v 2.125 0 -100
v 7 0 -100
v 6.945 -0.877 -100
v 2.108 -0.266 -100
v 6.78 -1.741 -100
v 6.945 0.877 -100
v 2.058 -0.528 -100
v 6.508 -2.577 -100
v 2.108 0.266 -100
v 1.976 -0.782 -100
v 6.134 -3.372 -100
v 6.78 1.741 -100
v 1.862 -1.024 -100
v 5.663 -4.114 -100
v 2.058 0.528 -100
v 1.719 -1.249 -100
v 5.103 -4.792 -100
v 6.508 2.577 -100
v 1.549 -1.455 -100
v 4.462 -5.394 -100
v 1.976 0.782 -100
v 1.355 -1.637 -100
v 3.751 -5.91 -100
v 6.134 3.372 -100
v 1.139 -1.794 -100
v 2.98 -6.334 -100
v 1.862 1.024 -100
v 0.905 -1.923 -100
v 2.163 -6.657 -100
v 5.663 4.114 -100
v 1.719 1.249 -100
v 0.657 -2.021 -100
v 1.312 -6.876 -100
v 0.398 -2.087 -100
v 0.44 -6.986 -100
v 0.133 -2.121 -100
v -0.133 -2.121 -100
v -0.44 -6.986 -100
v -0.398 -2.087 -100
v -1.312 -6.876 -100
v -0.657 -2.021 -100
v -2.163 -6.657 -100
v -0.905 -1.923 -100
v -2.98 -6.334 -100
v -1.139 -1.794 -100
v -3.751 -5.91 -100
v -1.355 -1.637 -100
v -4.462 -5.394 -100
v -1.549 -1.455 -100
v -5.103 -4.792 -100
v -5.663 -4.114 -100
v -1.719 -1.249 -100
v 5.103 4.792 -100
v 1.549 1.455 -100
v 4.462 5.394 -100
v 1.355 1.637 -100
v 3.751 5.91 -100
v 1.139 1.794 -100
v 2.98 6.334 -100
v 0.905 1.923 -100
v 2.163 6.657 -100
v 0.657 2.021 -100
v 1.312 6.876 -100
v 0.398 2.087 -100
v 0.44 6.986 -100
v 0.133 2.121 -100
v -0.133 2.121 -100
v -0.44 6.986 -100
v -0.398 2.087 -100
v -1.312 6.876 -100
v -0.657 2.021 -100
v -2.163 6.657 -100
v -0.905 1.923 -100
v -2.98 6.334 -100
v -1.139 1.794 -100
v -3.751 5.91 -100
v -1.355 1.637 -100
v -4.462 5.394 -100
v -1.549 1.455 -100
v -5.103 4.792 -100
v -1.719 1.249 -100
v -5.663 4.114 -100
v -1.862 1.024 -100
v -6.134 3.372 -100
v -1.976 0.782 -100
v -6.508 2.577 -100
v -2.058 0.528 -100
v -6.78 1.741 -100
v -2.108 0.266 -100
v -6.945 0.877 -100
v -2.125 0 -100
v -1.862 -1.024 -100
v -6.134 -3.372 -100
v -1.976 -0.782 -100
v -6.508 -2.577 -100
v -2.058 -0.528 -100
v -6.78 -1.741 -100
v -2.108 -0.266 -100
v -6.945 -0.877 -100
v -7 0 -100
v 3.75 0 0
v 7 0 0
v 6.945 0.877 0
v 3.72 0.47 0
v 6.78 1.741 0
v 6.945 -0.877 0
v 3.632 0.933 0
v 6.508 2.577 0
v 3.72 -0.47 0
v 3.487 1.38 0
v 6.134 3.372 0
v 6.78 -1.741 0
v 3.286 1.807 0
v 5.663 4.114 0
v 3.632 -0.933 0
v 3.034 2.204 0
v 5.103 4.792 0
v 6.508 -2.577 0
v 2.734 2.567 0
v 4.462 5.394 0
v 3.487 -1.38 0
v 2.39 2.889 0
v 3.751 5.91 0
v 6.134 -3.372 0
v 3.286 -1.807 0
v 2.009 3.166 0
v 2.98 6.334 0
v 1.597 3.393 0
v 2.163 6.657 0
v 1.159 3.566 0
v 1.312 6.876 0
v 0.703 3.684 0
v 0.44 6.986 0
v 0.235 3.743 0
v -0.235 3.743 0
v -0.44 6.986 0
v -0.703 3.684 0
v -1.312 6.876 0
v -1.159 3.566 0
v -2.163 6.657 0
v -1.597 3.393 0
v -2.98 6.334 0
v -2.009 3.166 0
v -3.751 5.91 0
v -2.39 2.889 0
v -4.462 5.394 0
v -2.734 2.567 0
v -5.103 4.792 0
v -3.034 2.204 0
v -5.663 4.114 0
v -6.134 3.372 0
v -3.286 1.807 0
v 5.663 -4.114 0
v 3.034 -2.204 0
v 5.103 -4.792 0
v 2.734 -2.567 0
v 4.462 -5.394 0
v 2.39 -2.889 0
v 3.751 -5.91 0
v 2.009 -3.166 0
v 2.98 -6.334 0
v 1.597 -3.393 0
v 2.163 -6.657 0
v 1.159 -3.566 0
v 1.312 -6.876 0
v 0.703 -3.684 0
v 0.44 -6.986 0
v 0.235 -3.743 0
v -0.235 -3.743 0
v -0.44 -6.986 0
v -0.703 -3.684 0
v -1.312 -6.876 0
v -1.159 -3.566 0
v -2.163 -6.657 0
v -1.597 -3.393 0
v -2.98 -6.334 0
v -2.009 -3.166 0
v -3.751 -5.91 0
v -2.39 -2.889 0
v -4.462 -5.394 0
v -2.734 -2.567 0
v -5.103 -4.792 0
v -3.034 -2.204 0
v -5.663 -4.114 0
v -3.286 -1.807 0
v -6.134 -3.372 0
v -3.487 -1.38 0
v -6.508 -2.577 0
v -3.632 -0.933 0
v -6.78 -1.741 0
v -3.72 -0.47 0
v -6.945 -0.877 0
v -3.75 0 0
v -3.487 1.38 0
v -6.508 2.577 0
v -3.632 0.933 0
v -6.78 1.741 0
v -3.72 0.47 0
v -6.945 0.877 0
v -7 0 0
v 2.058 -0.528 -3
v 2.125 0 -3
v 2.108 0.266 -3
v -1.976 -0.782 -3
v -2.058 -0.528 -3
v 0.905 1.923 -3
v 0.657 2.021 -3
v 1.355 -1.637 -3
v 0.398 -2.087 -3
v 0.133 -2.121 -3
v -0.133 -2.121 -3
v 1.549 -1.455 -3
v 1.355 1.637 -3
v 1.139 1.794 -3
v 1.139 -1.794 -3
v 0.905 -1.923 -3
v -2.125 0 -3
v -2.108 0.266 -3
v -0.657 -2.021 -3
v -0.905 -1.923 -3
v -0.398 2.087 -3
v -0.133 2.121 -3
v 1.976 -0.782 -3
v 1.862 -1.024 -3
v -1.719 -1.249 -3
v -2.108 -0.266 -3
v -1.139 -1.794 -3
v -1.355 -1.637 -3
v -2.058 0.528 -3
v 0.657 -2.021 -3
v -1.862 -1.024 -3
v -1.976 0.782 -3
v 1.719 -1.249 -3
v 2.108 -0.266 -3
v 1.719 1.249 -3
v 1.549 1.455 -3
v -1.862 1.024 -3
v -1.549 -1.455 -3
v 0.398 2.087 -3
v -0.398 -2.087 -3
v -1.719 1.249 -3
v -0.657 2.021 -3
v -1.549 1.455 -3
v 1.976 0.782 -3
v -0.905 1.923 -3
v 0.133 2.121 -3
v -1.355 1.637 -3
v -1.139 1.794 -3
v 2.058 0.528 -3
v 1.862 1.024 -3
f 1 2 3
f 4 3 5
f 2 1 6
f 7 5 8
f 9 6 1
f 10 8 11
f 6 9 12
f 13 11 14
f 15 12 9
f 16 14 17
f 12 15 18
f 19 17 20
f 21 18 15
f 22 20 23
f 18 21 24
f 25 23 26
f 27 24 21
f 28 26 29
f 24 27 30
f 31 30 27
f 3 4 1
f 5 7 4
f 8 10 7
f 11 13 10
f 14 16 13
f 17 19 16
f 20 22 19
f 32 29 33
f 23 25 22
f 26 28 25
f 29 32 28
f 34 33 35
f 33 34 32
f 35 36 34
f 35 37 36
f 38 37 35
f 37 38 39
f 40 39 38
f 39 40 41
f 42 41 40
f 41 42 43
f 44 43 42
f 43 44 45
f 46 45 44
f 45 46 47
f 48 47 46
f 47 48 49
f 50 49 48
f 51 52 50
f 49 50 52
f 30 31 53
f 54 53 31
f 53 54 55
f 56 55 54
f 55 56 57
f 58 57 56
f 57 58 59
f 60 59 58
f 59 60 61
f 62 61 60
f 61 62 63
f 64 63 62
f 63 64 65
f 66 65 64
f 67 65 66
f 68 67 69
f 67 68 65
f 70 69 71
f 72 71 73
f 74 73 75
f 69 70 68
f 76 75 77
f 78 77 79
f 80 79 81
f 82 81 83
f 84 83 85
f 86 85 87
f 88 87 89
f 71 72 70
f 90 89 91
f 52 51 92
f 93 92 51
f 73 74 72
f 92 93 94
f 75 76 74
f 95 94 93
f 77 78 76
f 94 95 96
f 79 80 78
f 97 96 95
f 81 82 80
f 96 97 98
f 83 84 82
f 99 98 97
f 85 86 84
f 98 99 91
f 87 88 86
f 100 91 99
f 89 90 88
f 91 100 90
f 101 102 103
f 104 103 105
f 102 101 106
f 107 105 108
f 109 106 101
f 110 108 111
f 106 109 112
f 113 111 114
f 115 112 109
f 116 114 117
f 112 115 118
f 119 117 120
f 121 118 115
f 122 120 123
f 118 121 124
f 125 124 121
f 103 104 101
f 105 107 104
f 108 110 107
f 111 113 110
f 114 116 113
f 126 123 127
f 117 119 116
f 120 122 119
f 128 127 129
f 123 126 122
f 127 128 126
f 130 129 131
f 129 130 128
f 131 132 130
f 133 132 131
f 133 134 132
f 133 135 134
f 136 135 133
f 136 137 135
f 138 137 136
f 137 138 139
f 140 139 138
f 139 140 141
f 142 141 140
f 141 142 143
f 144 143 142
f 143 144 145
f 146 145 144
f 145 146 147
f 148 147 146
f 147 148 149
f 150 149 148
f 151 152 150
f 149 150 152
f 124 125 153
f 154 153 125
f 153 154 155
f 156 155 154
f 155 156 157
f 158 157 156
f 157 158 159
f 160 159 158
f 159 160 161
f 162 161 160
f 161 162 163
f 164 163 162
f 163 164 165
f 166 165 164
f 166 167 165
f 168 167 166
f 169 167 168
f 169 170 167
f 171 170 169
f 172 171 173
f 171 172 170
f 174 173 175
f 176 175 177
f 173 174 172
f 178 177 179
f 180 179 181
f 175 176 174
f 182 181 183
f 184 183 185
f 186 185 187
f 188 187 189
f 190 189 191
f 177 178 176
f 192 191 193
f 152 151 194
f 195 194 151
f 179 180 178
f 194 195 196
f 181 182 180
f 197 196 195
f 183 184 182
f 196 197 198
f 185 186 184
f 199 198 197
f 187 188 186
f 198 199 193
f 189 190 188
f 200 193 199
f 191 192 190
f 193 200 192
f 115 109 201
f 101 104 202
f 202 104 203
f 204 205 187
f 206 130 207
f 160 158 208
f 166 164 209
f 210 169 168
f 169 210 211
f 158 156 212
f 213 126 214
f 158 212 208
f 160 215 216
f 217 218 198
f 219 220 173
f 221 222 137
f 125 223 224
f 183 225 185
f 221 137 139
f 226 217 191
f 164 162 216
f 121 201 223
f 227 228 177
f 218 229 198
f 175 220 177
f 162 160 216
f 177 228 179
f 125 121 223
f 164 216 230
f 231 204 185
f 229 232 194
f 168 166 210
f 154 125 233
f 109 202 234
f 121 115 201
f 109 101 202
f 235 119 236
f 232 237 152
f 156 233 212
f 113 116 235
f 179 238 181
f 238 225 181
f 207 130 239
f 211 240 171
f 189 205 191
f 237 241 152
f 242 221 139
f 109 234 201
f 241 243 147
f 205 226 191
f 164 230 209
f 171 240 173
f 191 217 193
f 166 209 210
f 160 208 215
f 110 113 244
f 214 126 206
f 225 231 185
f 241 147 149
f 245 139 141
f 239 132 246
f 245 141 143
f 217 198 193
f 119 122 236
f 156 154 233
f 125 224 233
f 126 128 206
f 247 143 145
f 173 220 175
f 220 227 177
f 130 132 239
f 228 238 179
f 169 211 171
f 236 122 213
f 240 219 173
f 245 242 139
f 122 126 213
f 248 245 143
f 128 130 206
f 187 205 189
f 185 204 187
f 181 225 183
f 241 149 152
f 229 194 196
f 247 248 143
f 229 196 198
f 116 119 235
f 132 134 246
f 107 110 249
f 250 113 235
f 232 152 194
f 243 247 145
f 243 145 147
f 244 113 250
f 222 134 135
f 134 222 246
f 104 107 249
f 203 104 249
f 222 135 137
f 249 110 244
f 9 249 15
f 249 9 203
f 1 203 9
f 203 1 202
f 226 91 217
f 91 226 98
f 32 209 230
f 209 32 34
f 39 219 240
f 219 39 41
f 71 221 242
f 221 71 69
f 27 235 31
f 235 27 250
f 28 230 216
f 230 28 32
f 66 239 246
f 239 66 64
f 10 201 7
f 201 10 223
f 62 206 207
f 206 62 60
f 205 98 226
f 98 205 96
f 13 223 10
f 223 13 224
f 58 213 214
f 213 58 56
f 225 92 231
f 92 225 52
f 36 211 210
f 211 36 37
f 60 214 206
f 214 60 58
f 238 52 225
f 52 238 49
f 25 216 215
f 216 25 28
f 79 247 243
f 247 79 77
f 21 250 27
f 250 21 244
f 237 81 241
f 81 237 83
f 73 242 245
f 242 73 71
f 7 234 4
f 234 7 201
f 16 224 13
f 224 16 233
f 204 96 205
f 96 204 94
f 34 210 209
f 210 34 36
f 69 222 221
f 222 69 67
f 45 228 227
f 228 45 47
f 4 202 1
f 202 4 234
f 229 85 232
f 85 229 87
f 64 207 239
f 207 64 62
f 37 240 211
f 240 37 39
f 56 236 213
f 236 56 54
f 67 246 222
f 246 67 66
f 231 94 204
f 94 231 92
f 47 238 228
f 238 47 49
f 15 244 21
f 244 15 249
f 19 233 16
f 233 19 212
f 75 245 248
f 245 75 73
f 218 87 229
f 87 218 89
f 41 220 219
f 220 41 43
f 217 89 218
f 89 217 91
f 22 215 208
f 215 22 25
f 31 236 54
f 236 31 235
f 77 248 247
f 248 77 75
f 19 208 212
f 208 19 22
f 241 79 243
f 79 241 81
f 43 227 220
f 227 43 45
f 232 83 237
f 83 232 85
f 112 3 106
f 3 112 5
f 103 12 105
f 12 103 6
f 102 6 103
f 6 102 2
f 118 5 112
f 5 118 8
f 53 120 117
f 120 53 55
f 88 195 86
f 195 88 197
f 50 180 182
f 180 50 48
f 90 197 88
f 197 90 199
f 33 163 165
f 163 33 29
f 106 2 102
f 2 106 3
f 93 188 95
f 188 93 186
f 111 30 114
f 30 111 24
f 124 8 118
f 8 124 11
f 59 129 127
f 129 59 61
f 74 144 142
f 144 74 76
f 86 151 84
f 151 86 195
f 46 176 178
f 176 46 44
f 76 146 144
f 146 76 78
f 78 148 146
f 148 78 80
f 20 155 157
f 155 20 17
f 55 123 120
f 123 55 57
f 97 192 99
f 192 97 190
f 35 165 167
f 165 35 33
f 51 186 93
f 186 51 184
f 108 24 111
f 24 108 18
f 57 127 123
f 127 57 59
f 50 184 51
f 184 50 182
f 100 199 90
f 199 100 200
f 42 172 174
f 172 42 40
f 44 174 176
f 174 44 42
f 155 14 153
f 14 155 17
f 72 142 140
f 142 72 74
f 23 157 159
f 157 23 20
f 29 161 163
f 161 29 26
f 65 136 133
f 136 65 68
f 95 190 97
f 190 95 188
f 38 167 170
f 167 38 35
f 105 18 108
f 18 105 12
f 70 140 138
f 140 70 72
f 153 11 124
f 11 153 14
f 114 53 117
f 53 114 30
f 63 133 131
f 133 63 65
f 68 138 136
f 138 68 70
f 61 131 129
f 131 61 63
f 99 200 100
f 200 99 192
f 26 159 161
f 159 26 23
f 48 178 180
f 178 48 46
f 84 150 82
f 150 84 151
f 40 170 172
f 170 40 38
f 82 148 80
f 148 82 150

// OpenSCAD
$fn = 50;


difference() {
	union() {
		translate(v = [0, 0, -100.0000000000]) {
			cylinder(h = 100, r = 7.0000000000);
		}
		cylinder(h = 0, r = 13.0000000000);
	}
	union() {
		translate(v = [0, 0, 0]) {
			rotate(a = [0, 0, 0]) {
				difference() {
					union() {
						#translate(v = [0, 0, -100.0000000000]) {
							cylinder(h = 100, r = 2.0000000000);
						}
						#translate(v = [0, 0, -3]) {
							cylinder(h = 3, r1 = 2.1250000000, r2 = 3.7500000000);
						}
						#translate(v = [0, 0, -100.0000000000]) {
							cylinder(h = 100, r = 2.1250000000);
						}
						#translate(v = [0, 0, -100.0000000000]) {
							cylinder(h = 100, r = 2.0000000000);
						}
					}
					union();
				}
			}
		}
	}
}
